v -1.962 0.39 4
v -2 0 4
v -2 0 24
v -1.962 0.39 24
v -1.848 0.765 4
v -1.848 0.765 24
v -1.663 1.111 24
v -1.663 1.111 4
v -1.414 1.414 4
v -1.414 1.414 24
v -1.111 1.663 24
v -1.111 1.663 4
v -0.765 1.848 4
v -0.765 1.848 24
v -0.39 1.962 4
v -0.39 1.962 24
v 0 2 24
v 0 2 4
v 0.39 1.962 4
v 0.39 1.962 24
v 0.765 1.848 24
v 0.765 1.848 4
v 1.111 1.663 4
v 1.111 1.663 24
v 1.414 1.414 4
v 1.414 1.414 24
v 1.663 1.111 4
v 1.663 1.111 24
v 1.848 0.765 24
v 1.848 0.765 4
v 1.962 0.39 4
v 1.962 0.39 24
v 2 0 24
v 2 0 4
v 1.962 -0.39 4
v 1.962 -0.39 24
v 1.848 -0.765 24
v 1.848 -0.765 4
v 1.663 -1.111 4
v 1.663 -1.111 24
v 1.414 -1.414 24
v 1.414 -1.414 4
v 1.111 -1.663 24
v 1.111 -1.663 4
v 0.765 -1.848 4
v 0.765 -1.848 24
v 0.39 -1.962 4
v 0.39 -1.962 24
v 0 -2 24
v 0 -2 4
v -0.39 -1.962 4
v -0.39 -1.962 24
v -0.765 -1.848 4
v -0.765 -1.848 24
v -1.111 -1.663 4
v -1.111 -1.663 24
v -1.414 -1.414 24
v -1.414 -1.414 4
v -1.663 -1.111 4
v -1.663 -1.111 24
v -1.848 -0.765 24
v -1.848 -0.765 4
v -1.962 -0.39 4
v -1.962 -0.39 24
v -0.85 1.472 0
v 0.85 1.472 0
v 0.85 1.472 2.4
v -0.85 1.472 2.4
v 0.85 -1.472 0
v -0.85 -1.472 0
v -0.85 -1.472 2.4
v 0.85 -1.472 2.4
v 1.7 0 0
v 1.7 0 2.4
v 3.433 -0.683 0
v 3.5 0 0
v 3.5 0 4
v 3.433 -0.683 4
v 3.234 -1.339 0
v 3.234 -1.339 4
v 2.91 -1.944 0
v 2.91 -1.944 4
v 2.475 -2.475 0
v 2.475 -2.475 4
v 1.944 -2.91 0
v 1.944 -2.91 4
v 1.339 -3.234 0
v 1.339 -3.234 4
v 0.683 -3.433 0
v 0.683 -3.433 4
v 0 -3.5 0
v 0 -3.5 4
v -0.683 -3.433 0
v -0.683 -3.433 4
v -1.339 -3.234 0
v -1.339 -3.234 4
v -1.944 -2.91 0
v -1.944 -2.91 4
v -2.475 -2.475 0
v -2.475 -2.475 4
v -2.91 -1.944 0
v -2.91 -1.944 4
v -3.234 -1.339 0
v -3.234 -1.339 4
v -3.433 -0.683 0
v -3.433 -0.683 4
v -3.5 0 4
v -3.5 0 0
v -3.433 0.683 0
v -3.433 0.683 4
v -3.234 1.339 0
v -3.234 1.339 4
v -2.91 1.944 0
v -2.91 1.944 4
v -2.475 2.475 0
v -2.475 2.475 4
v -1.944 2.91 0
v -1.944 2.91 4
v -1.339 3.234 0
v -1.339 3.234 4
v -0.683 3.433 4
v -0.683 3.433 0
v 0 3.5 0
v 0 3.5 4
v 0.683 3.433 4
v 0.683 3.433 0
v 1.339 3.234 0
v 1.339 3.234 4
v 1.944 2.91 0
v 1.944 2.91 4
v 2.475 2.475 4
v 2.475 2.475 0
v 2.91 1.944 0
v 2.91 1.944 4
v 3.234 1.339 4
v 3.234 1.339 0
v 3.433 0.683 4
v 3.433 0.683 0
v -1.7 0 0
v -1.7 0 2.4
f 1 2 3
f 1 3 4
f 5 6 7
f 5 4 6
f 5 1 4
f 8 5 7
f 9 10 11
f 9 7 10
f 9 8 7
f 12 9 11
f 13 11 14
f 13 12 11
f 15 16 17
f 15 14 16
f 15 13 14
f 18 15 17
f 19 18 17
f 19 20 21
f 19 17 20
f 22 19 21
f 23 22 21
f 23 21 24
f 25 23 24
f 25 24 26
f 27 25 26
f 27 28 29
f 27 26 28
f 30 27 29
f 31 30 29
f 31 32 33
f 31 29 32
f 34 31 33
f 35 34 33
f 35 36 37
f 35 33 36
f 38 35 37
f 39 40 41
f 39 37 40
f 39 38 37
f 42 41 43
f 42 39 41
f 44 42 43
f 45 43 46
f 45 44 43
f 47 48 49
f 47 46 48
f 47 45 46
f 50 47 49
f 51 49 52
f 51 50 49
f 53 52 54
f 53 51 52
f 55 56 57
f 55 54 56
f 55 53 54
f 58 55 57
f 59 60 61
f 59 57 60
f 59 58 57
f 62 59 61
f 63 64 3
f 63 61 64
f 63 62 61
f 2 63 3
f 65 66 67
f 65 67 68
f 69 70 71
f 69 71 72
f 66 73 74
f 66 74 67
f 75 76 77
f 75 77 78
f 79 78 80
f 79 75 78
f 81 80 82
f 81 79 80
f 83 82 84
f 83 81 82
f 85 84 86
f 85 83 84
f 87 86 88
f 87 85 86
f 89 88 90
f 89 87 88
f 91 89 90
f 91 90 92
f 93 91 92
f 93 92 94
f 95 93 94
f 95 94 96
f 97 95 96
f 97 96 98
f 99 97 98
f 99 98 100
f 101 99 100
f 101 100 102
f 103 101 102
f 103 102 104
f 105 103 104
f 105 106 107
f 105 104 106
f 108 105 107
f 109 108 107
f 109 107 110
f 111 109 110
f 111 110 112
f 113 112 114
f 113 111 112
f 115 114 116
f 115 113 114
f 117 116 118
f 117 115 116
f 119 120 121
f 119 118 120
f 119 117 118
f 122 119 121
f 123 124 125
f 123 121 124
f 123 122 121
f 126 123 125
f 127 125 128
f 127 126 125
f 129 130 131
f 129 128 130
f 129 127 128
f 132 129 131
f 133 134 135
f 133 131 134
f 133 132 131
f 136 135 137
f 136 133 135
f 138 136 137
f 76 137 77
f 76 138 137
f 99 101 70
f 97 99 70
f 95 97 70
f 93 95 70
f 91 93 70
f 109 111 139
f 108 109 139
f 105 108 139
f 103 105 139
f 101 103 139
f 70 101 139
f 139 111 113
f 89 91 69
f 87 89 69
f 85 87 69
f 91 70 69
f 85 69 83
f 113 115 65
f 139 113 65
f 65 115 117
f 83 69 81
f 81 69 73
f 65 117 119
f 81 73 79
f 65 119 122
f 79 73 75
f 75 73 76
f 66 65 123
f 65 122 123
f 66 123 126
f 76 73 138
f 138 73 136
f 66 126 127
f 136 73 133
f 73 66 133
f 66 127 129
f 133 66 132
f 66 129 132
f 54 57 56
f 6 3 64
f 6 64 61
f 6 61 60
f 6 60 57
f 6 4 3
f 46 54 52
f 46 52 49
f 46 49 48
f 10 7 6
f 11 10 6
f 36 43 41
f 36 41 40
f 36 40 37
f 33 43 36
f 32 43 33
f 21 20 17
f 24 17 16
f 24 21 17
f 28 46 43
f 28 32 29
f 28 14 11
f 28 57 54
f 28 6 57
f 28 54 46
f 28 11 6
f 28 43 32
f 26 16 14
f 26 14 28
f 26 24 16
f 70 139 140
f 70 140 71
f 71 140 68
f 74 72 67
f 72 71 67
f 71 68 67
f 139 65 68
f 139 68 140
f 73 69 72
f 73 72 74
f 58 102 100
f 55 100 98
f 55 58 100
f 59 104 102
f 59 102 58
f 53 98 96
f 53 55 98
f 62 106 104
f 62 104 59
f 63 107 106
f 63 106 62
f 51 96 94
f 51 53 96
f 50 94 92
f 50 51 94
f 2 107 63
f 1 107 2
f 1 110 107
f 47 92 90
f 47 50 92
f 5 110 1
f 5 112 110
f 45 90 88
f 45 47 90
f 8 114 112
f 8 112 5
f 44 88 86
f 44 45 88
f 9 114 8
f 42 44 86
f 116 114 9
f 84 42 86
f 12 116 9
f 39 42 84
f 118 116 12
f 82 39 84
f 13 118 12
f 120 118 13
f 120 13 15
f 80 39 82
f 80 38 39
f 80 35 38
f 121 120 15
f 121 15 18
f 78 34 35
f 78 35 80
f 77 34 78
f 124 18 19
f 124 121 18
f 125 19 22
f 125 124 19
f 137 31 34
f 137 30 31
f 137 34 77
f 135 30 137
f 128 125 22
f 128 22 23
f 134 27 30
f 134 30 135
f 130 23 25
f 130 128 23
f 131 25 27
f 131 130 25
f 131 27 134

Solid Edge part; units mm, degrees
sketch "Sketch1" plane through (0, 0, 0) normal (0, 0, 1) x (1, 0, 0)
  circle A0 centre (0, 0) radius 3.5
extrude "Protrusion1" add sketch "Sketch1" along normal blind 4
sketch "Sketch2" plane through (0, 0, 0) normal (0, 0, -1) x (1, 0, 0)
  line L0 (0.85, 1.4722) -> (1.7, 0)
  line L1 (1.7, 0) -> (0.85, -1.4722)
  line L2 (0.85, -1.4722) -> (-0.85, -1.4722)
  line L3 (-0.85, -1.4722) -> (-1.7, 0)
  line L4 (-1.7, 0) -> (-0.85, 1.4722)
  line L5 (-0.85, 1.4722) -> (0.85, 1.4722)
extrude "ExtrudedCutout_1" cut sketch "Sketch2" against normal blind 2.4
sketch "Sketch3" plane through (0, 0, 4) normal (0, 0, 1) x (-1, 0, 0)
  circle A0 centre (0, 0) radius 2
extrude "ExtrudedProtrusion_2" add sketch "Sketch3" along normal blind 20
cosmetic_thread "Thread_1" size "M4" thread depth 20
